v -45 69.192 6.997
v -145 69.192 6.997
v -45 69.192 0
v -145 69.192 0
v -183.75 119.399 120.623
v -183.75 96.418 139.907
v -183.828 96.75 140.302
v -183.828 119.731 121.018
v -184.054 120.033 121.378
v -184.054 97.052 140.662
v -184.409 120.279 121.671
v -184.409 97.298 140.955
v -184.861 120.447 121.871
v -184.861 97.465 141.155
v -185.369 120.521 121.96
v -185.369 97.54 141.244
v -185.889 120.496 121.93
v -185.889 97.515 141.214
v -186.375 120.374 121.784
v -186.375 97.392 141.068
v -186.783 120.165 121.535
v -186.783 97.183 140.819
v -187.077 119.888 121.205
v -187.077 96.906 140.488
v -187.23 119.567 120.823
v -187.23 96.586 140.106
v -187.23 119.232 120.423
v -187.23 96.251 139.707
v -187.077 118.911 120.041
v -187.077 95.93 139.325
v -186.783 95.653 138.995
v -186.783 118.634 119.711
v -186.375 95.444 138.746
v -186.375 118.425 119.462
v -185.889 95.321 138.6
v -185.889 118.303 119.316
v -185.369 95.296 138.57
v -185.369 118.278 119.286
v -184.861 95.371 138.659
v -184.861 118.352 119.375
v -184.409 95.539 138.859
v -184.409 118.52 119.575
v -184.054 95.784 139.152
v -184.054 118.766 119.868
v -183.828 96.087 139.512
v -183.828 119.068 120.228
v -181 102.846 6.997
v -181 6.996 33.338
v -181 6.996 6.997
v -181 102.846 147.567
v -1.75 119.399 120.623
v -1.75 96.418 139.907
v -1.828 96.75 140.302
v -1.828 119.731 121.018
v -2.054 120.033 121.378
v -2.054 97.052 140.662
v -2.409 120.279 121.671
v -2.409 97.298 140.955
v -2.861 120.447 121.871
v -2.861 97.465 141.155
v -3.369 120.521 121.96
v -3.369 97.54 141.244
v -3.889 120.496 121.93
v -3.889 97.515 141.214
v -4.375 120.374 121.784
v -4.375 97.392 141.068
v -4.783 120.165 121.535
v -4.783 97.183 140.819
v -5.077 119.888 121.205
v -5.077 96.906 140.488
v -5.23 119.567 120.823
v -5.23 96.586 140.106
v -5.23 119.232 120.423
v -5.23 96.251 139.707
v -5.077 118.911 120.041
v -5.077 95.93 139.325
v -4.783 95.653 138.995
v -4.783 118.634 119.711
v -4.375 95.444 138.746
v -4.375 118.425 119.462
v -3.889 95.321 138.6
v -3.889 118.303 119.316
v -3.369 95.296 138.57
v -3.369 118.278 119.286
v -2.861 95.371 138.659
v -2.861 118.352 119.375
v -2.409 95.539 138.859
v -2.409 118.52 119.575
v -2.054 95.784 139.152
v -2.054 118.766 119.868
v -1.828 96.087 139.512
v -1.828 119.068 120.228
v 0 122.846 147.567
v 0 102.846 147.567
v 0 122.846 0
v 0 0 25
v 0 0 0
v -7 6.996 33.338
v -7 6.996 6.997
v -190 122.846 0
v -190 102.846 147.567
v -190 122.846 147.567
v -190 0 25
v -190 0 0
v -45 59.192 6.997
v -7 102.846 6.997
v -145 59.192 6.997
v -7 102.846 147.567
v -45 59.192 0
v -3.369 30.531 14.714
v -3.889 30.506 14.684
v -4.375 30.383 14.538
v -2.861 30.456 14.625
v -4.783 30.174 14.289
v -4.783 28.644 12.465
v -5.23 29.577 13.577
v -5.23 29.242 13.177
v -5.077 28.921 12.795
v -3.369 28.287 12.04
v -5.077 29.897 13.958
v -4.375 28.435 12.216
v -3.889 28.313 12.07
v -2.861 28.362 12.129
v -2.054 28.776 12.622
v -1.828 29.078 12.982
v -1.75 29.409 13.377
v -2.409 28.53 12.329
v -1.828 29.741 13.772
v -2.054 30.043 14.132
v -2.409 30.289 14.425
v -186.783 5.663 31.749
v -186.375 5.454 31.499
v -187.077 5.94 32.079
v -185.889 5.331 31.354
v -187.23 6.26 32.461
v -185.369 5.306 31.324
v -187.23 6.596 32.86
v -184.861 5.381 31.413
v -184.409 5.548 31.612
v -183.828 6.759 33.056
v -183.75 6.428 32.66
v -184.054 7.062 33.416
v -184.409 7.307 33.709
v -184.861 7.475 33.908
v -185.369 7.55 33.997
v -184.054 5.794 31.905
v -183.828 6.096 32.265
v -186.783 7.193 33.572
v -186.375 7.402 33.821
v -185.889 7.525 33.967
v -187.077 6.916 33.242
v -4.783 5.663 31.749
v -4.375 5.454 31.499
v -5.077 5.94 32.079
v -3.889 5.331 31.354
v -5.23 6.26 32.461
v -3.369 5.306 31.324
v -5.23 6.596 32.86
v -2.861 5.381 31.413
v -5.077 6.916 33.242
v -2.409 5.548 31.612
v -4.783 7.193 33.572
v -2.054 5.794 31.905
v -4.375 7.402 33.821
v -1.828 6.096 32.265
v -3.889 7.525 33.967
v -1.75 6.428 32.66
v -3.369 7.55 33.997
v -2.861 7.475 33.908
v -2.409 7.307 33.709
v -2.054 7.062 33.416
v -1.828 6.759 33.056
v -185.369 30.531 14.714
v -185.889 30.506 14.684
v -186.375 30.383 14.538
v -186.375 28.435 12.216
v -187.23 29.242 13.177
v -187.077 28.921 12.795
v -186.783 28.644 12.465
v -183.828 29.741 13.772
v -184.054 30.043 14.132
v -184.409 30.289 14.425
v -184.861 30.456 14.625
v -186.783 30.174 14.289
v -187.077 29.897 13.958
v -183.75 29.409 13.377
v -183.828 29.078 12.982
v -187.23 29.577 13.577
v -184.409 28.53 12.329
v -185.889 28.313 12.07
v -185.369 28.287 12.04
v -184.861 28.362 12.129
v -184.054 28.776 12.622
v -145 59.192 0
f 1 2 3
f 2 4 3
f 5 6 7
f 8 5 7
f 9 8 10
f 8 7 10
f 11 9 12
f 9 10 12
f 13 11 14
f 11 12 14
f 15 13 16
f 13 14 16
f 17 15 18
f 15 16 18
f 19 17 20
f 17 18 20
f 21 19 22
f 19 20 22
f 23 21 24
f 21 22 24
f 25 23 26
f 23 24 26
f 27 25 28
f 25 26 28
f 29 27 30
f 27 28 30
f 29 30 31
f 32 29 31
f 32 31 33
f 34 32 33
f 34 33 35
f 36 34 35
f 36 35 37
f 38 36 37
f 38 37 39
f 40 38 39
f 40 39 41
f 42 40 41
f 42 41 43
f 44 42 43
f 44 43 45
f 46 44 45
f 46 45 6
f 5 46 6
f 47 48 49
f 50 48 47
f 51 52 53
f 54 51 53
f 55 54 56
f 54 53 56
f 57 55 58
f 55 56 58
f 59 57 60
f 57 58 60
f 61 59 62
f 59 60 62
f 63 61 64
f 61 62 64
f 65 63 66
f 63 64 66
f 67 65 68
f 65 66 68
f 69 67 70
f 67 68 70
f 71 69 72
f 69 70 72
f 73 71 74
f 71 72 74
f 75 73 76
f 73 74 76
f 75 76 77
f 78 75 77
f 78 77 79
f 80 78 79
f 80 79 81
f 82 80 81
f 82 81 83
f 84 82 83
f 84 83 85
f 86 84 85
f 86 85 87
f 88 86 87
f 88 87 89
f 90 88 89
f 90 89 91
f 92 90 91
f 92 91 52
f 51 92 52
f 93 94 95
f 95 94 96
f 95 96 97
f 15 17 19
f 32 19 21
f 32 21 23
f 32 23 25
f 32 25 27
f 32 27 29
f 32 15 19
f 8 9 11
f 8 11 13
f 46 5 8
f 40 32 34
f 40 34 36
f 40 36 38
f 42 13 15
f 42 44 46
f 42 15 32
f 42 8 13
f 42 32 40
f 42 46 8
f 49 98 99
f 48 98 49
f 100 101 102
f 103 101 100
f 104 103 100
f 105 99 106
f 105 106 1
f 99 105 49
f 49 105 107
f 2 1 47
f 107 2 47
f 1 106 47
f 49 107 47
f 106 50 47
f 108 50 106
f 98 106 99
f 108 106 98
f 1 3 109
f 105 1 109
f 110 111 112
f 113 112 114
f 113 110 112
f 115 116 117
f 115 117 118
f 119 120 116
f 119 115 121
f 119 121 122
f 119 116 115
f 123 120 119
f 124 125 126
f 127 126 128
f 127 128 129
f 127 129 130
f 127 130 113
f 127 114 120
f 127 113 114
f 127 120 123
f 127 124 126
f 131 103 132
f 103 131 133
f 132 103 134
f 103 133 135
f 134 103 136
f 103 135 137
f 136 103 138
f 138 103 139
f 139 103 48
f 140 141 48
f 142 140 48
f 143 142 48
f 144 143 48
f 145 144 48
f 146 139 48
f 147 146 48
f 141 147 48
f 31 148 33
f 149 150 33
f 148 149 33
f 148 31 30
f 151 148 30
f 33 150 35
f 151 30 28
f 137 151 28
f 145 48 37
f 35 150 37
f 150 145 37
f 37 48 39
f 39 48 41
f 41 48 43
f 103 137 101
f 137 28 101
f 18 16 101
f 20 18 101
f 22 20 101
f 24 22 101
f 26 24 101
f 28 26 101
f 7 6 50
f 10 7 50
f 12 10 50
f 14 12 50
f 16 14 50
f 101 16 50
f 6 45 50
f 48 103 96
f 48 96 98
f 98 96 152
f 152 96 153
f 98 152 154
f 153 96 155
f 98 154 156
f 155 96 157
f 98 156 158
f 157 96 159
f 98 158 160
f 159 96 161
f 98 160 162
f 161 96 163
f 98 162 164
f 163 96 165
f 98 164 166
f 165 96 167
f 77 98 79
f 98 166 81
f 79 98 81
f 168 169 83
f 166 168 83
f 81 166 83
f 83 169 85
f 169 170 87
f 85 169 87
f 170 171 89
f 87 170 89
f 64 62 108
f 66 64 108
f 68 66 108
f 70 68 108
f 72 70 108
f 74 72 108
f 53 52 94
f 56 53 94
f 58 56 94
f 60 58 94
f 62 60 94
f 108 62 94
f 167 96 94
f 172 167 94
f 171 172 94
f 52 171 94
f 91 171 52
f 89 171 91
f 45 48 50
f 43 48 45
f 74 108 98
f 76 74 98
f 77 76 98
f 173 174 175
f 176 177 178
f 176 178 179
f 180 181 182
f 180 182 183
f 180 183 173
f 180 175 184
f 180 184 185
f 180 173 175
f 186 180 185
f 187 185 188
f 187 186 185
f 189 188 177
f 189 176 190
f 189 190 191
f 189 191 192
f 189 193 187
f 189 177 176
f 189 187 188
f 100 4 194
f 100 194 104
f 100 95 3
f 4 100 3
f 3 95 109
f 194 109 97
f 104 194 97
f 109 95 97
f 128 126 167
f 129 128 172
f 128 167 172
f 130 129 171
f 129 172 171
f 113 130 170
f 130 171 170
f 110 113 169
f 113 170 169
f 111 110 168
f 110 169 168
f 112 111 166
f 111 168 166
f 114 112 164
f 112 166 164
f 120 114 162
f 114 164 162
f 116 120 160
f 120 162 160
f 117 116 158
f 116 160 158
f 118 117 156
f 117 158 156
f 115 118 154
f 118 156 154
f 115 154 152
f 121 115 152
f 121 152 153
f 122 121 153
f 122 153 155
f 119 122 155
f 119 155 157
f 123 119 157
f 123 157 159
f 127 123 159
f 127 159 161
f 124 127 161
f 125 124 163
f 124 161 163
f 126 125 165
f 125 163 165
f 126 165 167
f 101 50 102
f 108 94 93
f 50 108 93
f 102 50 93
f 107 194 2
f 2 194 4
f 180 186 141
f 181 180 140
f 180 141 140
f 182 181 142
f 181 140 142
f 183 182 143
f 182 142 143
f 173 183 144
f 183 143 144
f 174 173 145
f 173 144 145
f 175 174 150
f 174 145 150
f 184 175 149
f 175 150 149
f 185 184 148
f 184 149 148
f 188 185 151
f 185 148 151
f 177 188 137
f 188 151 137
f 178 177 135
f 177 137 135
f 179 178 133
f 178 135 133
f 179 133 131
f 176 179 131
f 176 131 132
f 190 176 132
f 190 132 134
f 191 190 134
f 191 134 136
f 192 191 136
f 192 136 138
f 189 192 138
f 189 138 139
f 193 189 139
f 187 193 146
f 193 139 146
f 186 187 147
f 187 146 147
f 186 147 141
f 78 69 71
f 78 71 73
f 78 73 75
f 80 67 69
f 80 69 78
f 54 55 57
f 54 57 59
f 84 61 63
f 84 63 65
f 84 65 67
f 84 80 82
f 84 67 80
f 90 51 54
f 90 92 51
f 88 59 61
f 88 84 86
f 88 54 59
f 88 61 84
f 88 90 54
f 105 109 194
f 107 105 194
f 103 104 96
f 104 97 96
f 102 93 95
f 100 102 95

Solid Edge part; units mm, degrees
sketch "Sketch1" plane through (0, 0, 0) normal (1, 0, 0) x (0, 1, 0)
  line L0 (0, 25) -> (102.846, 147.5671)
  line L1 (102.846, 147.5671) -> (122.846, 147.5671)
  line L2 (122.846, 147.5671) -> (122.846, 0)
  line L3 (122.846, 0) -> (5.5389, 0)
  line L4 (5.5389, 0) -> (0, 0)
  line L5 (0, 0) -> (0, 25)
extrude "Protrusion1" add sketch "Sketch1" against normal blind 190
sketch "Sketch2" plane through (-95, 112.846, 147.5671) normal (0, 0, 1) x (1, 0, 0)
  line L0 (88, -10) -> (88, -105.85)
  line L1 (88, -105.85) -> (-86, -105.85)
  line L2 (-86, -105.85) -> (-86, -10)
  line L3 (-86, -10) -> (0, -10)
  line L4 (0, -10) -> (88, -10)
extrude "Cutout1" cut sketch "Sketch2" against normal blind 140.57
sketch "Sketch3" plane through (-95, 61.423, 0) normal (0, 0, -1) x (0, 1, 0)
  line L0 (-2.2305, 50) -> (-2.2305, -50)
  line L1 (-2.2305, -50) -> (7.7695, -50)
  line L2 (7.7695, -50) -> (7.7695, 50)
  line L3 (7.7695, 50) -> (-2.2305, 50)
extrude "VaciadoExtruido_3" cut sketch "Sketch3" against normal blind 7
sketch "Sketch4" plane through (-95, 51.423, 86.2836) normal (0, -0.766, 0.6428) x (1, 0, 0)
  circle A0 centre (91.5, 70) radius 1.75
extrude "Cutout2" cut sketch "Sketch4" against normal blind 30
sketch "Sketch5" plane through (-95, 51.423, 86.2836) normal (0, -0.766, 0.6428) x (1, 0, 0)
  circle A0 centre (91.5, -70) radius 1.75
extrude "VaciadoExtruido_14" cut sketch "Sketch5" against normal blind 30
sketch "Sketch6" plane through (-95, 51.423, 86.2836) normal (0, -0.766, 0.6428) x (1, 0, 0)
  circle A0 centre (-90.5, 70) radius 1.75
extrude "VaciadoExtruido_15" cut sketch "Sketch6" against normal blind 30
sketch "Sketch7" plane through (-95, 51.423, 86.2836) normal (0, -0.766, 0.6428) x (1, 0, 0)
  circle A0 centre (-90.5, -70) radius 1.75
extrude "VaciadoExtruido_16" cut sketch "Sketch7" against normal blind 30
